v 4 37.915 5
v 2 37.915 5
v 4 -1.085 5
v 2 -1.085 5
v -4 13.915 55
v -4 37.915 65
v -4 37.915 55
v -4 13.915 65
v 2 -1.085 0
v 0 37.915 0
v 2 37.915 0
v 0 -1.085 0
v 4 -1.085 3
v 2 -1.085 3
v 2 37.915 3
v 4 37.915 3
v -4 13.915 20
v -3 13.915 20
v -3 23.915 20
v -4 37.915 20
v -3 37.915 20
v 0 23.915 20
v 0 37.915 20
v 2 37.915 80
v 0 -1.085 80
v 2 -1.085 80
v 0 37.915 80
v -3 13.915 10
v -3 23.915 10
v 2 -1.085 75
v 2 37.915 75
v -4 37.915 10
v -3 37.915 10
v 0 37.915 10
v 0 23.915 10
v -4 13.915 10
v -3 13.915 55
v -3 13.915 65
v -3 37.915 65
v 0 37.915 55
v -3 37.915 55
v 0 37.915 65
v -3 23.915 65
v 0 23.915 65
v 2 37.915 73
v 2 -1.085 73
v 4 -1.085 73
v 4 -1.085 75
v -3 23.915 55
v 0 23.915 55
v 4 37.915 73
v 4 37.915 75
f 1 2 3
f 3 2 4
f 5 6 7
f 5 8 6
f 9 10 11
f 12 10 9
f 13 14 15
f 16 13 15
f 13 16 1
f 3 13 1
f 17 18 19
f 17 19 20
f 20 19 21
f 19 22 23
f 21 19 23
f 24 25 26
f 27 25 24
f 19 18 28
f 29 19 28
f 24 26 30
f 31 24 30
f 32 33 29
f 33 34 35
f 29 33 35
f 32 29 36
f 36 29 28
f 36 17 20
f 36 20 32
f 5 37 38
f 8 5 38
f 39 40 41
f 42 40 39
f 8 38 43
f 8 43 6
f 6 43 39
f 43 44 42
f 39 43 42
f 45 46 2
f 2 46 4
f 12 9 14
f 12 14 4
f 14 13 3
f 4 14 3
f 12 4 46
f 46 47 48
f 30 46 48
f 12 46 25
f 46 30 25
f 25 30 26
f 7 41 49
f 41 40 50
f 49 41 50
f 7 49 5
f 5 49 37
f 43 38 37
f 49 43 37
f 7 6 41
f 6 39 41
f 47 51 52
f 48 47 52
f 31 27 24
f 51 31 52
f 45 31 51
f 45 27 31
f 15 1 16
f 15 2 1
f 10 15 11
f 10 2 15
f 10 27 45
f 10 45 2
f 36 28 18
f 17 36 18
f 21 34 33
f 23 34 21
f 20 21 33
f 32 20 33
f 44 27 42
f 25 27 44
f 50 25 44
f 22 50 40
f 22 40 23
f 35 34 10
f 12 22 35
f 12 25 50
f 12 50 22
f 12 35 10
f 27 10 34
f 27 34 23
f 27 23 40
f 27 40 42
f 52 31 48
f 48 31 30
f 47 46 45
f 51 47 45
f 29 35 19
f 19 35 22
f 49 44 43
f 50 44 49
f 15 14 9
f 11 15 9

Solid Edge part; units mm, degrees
sketch "Sketch1" plane through (0, 0, 0) normal (-1, 0, 0) x (0, -1, 0)
  line L0 (2.0853, 0) -> (2.0853, 80)
  line L1 (2.0853, 80) -> (-37.9147, 80)
  line L2 (-37.9147, 80) -> (-37.9147, 0)
  line L3 (-37.9147, 0) -> (2.0853, 0)
extrude "Protrusion1" add sketch "Sketch1" against normal blind 2
sketch "Sketch2" plane through (0, 18.9573, 40) normal (-1, 0, 0) x (0, 0, 1)
  line L0 (-20, 4.9573) -> (-20, 18.9573)
  line L1 (-30, 18.9573) -> (-20, 18.9573)
  line L2 (-30, 18.9573) -> (-30, 4.9573)
  line L3 (-30, 4.9573) -> (-20, 4.9573)
  line L4 (25, 18.9573) -> (25, 4.9573)
  line L5 (25, 4.9573) -> (15, 4.9573)
  line L6 (15, 4.9573) -> (15, 18.9573)
  line L7 (15, 18.9573) -> (25, 18.9573)
extrude "Vysunutí_2" add sketch "Sketch2" along normal blind 3
sketch "Sketch3" plane through (-3, 30.9147, 60) normal (-1, 0, 0) x (0, 0, 1)
  line L0 (5, -17) -> (5, 7)
  line L1 (5, 7) -> (-5, 7)
  line L2 (-5, 7) -> (-5, -17)
  line L3 (-5, -17) -> (5, -17)
  line L4 (-40, -17) -> (-40, 7)
  line L5 (-40, 7) -> (-50, 7)
  line L6 (-50, 7) -> (-50, -17)
  line L7 (-50, -17) -> (-40, -17)
extrude "Vysunutí_3" add sketch "Sketch3" along normal blind 1
sketch "Sketch4" plane through (2, 17.9147, 40) normal (1, 0, 0) x (0, 0, 1)
  line L0 (33, 20) -> (33, -20)
  line L1 (33, -20) -> (35, -20)
  line L2 (35, -20) -> (35, 20)
  line L3 (35, 20) -> (33, 20)
extrude "Protrusion2" add sketch "Sketch4" along normal blind 2
sketch "Sketch5" plane through (2, 17.9147, 36.5) normal (1, 0, 0) x (0, 0, -1)
  line L0 (31.5, 20) -> (31.5, -20)
  line L1 (31.5, -20) -> (33.5, -20)
  line L2 (33.5, -20) -> (33.5, 20)
  line L3 (33.5, 20) -> (31.5, 20)
extrude "Vysunutí_6" add sketch "Sketch5" along normal blind 2
sketch "Sketch6" plane through (2, 17.9147, 39) normal (1, 0, 0) x (0, -1, 0)
  line L0 (19, 39) -> (19, -41)
  line L1 (19, -41) -> (20, -41)
  line L2 (20, -41) -> (20, 39)
  line L3 (20, 39) -> (19, 39)
extrude "Vyříznutí_1" cut sketch "Sketch6" against normal blind 2
sketch "Sketch7" plane through (2, 17.9147, 39) normal (1, 0, 0) x (0, -1, 0)
  line L0 (20, -41) -> (20, 39)
  line L1 (20, 39) -> (19, 39)
  line L2 (19, 39) -> (19, -41)
  line L3 (19, -41) -> (20, -41)
extrude "Vyříznutí_2" cut sketch "Sketch7" along normal blind 2
